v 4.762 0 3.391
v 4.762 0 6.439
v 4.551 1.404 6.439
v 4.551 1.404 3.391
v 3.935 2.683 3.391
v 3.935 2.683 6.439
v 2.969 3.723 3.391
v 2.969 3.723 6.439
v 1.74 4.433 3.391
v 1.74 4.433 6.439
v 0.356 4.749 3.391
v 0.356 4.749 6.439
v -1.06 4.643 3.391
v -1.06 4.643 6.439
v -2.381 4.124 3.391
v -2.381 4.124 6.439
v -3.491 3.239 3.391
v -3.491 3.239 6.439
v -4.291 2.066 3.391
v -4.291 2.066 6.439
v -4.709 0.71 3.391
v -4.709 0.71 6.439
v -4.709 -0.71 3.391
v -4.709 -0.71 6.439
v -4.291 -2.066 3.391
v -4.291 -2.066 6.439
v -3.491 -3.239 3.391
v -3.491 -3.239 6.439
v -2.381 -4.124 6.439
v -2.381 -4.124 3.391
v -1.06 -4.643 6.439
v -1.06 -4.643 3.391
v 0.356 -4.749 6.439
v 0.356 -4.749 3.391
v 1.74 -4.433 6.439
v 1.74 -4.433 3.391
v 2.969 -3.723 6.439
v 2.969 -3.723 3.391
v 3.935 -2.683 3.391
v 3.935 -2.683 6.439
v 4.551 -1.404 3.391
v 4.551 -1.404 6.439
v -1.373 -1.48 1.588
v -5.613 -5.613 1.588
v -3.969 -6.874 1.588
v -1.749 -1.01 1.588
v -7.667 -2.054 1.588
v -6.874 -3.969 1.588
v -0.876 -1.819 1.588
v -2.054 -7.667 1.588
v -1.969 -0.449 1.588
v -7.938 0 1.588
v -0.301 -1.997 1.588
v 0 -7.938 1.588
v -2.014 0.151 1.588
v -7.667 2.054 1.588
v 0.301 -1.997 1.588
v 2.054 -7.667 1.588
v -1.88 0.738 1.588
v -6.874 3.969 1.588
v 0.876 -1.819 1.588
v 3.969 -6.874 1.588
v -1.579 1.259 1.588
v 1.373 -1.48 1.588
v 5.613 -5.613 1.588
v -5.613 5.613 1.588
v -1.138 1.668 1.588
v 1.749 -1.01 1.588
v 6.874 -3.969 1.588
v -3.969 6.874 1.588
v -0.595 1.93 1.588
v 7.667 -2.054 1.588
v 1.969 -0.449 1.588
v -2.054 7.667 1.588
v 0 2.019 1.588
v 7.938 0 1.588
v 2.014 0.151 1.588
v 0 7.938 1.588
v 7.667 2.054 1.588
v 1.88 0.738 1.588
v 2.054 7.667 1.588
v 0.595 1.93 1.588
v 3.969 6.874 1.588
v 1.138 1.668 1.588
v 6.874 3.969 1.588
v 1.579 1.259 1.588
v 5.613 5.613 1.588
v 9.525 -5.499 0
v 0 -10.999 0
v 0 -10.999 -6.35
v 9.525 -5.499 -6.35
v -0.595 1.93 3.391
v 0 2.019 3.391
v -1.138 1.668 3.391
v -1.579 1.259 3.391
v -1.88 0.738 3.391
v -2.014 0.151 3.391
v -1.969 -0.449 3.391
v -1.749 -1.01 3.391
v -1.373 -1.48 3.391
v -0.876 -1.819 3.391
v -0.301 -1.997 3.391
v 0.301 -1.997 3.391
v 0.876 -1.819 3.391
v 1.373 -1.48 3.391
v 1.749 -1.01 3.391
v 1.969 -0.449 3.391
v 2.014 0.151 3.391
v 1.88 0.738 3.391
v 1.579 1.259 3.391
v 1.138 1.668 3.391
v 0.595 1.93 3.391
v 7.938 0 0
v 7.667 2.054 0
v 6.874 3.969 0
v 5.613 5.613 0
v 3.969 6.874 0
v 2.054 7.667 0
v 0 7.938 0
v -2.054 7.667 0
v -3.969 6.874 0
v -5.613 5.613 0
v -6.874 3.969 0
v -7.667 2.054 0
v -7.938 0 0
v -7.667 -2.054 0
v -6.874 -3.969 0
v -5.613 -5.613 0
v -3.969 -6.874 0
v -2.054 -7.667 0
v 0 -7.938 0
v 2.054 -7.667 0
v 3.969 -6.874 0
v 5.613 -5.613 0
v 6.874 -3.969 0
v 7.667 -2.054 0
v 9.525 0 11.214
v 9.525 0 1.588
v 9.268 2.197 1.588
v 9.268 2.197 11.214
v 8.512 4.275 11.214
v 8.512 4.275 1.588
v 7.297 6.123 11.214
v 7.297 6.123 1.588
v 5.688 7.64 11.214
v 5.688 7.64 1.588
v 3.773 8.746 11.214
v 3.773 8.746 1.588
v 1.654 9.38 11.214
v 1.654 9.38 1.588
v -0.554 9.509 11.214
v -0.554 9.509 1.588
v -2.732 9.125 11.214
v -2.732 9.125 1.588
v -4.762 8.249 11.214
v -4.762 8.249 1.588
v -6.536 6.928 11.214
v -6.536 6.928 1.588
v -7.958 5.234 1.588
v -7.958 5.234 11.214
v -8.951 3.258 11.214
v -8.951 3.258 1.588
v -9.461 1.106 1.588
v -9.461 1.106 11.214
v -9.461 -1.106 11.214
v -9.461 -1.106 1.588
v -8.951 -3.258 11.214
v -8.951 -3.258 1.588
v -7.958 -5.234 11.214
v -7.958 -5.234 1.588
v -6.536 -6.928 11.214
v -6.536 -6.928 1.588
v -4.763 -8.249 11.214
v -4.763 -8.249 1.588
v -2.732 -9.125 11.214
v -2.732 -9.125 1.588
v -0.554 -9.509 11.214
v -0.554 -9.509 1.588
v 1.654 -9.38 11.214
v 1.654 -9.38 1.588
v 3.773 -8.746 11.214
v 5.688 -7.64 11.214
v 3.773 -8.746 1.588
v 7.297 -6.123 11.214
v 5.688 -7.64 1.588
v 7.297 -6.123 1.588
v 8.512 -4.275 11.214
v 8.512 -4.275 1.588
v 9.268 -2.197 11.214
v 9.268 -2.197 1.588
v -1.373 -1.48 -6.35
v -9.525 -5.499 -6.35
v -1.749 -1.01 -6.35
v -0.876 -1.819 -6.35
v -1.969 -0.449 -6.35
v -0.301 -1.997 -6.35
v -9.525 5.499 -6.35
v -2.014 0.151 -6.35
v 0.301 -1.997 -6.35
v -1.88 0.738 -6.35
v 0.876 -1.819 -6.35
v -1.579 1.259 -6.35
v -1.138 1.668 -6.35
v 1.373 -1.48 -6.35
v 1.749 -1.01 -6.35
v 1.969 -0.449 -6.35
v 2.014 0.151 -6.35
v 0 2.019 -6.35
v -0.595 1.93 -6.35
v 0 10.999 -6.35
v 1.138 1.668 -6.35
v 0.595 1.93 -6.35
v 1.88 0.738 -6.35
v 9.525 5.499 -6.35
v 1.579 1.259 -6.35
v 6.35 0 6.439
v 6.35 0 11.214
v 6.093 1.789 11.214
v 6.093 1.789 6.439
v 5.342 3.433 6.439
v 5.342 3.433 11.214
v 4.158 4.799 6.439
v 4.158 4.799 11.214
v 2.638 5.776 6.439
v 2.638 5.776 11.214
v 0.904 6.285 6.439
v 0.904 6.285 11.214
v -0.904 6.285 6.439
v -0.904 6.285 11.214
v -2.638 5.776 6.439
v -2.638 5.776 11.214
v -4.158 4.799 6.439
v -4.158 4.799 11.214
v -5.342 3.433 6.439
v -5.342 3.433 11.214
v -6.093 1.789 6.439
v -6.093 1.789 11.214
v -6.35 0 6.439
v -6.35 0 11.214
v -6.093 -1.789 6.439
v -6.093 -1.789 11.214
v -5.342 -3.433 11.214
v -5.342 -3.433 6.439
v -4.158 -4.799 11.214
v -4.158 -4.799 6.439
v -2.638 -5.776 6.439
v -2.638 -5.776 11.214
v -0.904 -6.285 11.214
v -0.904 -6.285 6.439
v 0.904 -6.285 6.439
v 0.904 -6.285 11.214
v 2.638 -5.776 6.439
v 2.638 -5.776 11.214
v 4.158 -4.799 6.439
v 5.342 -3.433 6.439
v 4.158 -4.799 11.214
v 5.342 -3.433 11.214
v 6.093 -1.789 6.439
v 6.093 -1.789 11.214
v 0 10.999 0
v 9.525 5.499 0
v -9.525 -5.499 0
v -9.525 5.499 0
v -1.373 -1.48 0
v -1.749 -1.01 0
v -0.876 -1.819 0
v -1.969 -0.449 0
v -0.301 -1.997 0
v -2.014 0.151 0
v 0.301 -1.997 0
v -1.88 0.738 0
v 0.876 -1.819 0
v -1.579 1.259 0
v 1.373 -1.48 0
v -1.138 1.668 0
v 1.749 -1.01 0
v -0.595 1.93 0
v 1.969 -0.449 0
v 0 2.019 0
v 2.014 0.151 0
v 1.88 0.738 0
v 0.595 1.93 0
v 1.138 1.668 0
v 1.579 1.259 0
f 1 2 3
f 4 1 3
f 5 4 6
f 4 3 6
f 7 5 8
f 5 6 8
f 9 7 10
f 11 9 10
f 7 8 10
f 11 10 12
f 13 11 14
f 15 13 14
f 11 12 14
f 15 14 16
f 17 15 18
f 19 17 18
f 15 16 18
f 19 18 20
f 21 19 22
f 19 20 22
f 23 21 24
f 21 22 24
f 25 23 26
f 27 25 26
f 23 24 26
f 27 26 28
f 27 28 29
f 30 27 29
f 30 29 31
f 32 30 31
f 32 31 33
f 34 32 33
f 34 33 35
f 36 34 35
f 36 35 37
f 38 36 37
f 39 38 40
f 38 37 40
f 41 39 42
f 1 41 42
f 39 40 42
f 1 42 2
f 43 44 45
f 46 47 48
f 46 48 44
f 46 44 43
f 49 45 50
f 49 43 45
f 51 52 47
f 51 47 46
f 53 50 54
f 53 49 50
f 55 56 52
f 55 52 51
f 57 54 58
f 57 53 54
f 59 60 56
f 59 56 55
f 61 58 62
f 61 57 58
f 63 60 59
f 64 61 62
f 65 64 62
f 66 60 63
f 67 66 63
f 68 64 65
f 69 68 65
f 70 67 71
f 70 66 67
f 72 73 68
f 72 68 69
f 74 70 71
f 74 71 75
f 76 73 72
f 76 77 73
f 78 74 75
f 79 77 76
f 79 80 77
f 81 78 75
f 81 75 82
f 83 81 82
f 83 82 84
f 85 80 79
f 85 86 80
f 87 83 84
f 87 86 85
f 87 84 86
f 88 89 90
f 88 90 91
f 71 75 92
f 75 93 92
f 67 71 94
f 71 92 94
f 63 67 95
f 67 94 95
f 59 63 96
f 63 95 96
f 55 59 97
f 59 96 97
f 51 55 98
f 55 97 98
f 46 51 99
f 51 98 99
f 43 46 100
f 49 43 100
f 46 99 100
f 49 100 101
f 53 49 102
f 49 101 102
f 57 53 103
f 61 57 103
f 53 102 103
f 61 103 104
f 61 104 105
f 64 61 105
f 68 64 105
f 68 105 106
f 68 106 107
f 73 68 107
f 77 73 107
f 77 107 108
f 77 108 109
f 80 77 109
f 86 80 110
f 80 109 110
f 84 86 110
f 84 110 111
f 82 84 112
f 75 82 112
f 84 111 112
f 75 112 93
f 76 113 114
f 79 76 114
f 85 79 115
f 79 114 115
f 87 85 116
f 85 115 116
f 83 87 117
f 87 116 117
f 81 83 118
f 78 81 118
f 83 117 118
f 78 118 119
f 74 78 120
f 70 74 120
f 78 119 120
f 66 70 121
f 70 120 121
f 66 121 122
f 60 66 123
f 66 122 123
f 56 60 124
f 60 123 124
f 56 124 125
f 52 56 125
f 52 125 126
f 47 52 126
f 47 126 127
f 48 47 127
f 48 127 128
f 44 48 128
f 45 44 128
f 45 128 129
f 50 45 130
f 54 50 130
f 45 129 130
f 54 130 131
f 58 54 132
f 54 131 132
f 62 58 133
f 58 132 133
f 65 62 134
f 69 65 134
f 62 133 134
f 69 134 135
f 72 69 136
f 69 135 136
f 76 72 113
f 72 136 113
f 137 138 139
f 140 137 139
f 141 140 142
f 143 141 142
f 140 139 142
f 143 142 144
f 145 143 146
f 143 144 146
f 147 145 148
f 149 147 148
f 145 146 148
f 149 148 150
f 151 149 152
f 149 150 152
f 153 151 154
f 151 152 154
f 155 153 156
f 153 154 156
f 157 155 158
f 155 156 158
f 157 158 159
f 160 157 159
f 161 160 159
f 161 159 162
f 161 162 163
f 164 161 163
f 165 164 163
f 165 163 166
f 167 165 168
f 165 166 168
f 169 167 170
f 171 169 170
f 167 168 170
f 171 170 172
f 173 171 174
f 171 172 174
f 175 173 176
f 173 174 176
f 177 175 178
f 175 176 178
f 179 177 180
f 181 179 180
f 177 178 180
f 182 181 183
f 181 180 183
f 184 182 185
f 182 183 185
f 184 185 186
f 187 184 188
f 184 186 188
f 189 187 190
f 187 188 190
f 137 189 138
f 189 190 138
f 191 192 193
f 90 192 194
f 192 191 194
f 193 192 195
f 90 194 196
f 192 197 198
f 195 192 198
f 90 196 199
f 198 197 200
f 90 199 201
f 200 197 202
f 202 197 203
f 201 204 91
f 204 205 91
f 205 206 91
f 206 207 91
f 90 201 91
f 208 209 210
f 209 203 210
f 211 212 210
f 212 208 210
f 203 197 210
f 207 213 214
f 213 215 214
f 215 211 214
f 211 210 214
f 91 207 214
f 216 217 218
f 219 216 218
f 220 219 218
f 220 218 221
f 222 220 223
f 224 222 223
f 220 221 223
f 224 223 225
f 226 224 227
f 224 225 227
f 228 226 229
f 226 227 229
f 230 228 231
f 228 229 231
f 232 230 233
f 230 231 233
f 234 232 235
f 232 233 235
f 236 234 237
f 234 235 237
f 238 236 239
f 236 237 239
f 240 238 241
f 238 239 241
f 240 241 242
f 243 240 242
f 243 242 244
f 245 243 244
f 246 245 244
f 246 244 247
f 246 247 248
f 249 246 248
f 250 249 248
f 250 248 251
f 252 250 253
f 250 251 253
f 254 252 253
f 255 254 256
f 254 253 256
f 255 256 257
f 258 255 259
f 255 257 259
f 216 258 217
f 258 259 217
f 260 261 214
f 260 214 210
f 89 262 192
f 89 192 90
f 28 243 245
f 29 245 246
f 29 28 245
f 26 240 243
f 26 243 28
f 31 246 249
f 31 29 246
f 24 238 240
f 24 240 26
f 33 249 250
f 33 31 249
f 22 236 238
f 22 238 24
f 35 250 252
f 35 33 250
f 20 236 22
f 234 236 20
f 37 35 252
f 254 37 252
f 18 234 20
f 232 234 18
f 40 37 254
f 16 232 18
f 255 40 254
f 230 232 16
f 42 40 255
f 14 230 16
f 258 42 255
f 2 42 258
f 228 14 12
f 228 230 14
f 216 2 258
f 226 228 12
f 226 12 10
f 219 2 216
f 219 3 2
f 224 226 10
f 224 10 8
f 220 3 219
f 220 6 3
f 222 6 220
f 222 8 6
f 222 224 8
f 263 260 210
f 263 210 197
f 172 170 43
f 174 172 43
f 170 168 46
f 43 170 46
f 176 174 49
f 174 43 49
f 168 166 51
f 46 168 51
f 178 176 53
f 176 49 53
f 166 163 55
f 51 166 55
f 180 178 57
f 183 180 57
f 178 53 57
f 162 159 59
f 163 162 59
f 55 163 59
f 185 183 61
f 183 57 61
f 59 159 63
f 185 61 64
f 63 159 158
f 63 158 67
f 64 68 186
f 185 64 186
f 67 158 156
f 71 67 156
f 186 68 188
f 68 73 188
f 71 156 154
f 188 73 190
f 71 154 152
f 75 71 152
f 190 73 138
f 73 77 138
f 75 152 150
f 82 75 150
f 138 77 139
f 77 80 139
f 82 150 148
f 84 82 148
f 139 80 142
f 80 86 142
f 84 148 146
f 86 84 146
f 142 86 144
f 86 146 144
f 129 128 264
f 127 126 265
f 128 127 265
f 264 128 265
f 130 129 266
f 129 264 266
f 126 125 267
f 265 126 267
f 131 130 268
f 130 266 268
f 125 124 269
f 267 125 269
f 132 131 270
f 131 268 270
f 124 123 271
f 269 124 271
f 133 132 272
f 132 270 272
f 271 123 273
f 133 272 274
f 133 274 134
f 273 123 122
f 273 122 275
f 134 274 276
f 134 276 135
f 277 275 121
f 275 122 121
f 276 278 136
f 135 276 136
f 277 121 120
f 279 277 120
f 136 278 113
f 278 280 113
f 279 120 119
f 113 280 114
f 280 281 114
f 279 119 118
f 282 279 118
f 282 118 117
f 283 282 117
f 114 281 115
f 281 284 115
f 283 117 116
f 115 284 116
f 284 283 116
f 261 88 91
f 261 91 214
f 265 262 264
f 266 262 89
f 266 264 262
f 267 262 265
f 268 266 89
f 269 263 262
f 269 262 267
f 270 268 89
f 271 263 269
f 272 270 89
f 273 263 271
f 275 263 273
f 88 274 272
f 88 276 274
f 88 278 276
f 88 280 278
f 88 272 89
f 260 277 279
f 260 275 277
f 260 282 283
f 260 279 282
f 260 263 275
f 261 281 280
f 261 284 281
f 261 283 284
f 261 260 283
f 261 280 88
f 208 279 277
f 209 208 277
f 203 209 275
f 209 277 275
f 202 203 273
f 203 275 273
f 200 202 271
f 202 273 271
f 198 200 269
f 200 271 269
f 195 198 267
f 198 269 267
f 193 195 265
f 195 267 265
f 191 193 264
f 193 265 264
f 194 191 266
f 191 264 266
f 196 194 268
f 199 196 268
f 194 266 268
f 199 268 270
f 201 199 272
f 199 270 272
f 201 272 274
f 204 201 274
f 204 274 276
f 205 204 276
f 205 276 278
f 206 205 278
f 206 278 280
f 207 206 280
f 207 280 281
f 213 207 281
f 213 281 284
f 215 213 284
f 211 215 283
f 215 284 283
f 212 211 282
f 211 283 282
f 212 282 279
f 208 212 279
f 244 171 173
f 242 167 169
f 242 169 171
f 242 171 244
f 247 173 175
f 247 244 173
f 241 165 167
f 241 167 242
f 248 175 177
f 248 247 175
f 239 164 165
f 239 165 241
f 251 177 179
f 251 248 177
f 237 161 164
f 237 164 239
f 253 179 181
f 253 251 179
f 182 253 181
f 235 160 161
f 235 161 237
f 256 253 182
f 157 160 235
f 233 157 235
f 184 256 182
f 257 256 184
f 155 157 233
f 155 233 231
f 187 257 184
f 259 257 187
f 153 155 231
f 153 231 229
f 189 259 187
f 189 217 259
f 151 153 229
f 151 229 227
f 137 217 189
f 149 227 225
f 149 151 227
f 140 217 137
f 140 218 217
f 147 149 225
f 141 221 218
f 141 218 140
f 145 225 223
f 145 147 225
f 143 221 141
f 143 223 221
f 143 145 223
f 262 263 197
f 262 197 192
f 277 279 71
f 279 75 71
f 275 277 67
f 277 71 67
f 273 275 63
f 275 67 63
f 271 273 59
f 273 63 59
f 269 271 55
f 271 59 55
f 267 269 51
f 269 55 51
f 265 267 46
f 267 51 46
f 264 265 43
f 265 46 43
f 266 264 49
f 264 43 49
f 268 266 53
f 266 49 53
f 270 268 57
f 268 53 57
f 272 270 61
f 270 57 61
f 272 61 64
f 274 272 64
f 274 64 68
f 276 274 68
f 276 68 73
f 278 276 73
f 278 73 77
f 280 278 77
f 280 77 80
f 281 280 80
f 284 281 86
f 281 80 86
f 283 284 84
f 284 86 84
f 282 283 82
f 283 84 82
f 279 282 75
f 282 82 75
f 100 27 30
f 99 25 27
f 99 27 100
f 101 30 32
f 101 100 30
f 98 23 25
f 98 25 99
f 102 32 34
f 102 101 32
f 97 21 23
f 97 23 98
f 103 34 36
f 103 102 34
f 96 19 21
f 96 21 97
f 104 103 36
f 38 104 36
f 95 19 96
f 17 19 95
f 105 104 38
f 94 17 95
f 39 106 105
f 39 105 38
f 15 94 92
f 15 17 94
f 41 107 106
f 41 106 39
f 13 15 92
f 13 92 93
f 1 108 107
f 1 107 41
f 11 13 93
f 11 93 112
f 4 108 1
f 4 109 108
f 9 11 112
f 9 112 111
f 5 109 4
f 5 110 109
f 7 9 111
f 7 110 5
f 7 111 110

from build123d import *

# Parameters (mm, degrees)
BOSS_EXTRUDE1_DEPTH = 6.35
SKETCH2_R           = 7.9375
BOSS_EXTRUDE3_DEPTH = 1.5875
SKETCH7_R           = 9.525
BOSS_EXTRUDE4_DEPTH = 9.6266
SKETCH10_W          = 2.0193
SKETCH10_H          = 17.5641
SKETCH12_R          = 6.35
CUT_EXTRUDE5_DEPTH  = 4.7752
SKETCH13_R          = 4.7625
CUT_EXTRUDE6_DEPTH  = 3.048


with BuildPart() as part:
    # Sketch1 → Boss-Extrude1 (new body)
    with BuildSketch(Plane.XY):
        Polygon((0, -10.998522628), (9.525, -5.499261314), (9.525, 5.499261314), (0, 10.998522628), (-9.525, 5.499261314), (-9.525, -5.499261314), align=None)
    extrude(amount=-BOSS_EXTRUDE1_DEPTH)


with BuildPart() as body_2:
    # Sketch2 → Boss-Extrude3 (new body)
    with BuildSketch(Plane.XY):
        Circle(SKETCH2_R)
    extrude(amount=BOSS_EXTRUDE3_DEPTH)


with BuildPart() as body_3:
    # Sketch7 → Boss-Extrude4 (new body)
    with BuildSketch(Plane.XY.offset(1.5875)):
        Circle(SKETCH7_R)
    extrude(amount=BOSS_EXTRUDE4_DEPTH)


with BuildPart() as f_10_32_tapped_hole2_tool:
    # Sketch10 → #10-32 Tapped Hole2 (revolve)
    with BuildSketch(Plane(origin=(0, 0, -6.35), x_dir=(0, 1, 0), z_dir=(1, 0, 0))):
        with Locations((1.00965, 8.78205)):
            Rectangle(SKETCH10_W, SKETCH10_H)
    revolve(axis=Axis((0, 0, -12.7), (0, 0, 1)))


with BuildPart() as part_1:
    add(part.part)

    # #10-32 Tapped Hole2: cut by f_10_32_tapped_hole2_tool
    add(f_10_32_tapped_hole2_tool.part, mode=Mode.SUBTRACT)


with BuildPart() as body_2_1:
    add(body_2.part)

    # #10-32 Tapped Hole2: cut by f_10_32_tapped_hole2_tool
    add(f_10_32_tapped_hole2_tool.part, mode=Mode.SUBTRACT)


with BuildPart() as body_3_1:
    add(body_3.part)

    # #10-32 Tapped Hole2: cut by f_10_32_tapped_hole2_tool
    add(f_10_32_tapped_hole2_tool.part, mode=Mode.SUBTRACT)

    # Sketch12 → Cut-Extrude5 (cut)
    with BuildSketch(Plane.XY.offset(11.2141)):
        Circle(SKETCH12_R)
    extrude(amount=-CUT_EXTRUDE5_DEPTH, mode=Mode.SUBTRACT)

    # Sketch13 → Cut-Extrude6 (cut)
    with BuildSketch(Plane.XY.offset(6.4389)):
        Circle(SKETCH13_R)
    extrude(amount=-CUT_EXTRUDE6_DEPTH, mode=Mode.SUBTRACT)


solid = Compound([part_1.part, body_2_1.part, body_3_1.part])
